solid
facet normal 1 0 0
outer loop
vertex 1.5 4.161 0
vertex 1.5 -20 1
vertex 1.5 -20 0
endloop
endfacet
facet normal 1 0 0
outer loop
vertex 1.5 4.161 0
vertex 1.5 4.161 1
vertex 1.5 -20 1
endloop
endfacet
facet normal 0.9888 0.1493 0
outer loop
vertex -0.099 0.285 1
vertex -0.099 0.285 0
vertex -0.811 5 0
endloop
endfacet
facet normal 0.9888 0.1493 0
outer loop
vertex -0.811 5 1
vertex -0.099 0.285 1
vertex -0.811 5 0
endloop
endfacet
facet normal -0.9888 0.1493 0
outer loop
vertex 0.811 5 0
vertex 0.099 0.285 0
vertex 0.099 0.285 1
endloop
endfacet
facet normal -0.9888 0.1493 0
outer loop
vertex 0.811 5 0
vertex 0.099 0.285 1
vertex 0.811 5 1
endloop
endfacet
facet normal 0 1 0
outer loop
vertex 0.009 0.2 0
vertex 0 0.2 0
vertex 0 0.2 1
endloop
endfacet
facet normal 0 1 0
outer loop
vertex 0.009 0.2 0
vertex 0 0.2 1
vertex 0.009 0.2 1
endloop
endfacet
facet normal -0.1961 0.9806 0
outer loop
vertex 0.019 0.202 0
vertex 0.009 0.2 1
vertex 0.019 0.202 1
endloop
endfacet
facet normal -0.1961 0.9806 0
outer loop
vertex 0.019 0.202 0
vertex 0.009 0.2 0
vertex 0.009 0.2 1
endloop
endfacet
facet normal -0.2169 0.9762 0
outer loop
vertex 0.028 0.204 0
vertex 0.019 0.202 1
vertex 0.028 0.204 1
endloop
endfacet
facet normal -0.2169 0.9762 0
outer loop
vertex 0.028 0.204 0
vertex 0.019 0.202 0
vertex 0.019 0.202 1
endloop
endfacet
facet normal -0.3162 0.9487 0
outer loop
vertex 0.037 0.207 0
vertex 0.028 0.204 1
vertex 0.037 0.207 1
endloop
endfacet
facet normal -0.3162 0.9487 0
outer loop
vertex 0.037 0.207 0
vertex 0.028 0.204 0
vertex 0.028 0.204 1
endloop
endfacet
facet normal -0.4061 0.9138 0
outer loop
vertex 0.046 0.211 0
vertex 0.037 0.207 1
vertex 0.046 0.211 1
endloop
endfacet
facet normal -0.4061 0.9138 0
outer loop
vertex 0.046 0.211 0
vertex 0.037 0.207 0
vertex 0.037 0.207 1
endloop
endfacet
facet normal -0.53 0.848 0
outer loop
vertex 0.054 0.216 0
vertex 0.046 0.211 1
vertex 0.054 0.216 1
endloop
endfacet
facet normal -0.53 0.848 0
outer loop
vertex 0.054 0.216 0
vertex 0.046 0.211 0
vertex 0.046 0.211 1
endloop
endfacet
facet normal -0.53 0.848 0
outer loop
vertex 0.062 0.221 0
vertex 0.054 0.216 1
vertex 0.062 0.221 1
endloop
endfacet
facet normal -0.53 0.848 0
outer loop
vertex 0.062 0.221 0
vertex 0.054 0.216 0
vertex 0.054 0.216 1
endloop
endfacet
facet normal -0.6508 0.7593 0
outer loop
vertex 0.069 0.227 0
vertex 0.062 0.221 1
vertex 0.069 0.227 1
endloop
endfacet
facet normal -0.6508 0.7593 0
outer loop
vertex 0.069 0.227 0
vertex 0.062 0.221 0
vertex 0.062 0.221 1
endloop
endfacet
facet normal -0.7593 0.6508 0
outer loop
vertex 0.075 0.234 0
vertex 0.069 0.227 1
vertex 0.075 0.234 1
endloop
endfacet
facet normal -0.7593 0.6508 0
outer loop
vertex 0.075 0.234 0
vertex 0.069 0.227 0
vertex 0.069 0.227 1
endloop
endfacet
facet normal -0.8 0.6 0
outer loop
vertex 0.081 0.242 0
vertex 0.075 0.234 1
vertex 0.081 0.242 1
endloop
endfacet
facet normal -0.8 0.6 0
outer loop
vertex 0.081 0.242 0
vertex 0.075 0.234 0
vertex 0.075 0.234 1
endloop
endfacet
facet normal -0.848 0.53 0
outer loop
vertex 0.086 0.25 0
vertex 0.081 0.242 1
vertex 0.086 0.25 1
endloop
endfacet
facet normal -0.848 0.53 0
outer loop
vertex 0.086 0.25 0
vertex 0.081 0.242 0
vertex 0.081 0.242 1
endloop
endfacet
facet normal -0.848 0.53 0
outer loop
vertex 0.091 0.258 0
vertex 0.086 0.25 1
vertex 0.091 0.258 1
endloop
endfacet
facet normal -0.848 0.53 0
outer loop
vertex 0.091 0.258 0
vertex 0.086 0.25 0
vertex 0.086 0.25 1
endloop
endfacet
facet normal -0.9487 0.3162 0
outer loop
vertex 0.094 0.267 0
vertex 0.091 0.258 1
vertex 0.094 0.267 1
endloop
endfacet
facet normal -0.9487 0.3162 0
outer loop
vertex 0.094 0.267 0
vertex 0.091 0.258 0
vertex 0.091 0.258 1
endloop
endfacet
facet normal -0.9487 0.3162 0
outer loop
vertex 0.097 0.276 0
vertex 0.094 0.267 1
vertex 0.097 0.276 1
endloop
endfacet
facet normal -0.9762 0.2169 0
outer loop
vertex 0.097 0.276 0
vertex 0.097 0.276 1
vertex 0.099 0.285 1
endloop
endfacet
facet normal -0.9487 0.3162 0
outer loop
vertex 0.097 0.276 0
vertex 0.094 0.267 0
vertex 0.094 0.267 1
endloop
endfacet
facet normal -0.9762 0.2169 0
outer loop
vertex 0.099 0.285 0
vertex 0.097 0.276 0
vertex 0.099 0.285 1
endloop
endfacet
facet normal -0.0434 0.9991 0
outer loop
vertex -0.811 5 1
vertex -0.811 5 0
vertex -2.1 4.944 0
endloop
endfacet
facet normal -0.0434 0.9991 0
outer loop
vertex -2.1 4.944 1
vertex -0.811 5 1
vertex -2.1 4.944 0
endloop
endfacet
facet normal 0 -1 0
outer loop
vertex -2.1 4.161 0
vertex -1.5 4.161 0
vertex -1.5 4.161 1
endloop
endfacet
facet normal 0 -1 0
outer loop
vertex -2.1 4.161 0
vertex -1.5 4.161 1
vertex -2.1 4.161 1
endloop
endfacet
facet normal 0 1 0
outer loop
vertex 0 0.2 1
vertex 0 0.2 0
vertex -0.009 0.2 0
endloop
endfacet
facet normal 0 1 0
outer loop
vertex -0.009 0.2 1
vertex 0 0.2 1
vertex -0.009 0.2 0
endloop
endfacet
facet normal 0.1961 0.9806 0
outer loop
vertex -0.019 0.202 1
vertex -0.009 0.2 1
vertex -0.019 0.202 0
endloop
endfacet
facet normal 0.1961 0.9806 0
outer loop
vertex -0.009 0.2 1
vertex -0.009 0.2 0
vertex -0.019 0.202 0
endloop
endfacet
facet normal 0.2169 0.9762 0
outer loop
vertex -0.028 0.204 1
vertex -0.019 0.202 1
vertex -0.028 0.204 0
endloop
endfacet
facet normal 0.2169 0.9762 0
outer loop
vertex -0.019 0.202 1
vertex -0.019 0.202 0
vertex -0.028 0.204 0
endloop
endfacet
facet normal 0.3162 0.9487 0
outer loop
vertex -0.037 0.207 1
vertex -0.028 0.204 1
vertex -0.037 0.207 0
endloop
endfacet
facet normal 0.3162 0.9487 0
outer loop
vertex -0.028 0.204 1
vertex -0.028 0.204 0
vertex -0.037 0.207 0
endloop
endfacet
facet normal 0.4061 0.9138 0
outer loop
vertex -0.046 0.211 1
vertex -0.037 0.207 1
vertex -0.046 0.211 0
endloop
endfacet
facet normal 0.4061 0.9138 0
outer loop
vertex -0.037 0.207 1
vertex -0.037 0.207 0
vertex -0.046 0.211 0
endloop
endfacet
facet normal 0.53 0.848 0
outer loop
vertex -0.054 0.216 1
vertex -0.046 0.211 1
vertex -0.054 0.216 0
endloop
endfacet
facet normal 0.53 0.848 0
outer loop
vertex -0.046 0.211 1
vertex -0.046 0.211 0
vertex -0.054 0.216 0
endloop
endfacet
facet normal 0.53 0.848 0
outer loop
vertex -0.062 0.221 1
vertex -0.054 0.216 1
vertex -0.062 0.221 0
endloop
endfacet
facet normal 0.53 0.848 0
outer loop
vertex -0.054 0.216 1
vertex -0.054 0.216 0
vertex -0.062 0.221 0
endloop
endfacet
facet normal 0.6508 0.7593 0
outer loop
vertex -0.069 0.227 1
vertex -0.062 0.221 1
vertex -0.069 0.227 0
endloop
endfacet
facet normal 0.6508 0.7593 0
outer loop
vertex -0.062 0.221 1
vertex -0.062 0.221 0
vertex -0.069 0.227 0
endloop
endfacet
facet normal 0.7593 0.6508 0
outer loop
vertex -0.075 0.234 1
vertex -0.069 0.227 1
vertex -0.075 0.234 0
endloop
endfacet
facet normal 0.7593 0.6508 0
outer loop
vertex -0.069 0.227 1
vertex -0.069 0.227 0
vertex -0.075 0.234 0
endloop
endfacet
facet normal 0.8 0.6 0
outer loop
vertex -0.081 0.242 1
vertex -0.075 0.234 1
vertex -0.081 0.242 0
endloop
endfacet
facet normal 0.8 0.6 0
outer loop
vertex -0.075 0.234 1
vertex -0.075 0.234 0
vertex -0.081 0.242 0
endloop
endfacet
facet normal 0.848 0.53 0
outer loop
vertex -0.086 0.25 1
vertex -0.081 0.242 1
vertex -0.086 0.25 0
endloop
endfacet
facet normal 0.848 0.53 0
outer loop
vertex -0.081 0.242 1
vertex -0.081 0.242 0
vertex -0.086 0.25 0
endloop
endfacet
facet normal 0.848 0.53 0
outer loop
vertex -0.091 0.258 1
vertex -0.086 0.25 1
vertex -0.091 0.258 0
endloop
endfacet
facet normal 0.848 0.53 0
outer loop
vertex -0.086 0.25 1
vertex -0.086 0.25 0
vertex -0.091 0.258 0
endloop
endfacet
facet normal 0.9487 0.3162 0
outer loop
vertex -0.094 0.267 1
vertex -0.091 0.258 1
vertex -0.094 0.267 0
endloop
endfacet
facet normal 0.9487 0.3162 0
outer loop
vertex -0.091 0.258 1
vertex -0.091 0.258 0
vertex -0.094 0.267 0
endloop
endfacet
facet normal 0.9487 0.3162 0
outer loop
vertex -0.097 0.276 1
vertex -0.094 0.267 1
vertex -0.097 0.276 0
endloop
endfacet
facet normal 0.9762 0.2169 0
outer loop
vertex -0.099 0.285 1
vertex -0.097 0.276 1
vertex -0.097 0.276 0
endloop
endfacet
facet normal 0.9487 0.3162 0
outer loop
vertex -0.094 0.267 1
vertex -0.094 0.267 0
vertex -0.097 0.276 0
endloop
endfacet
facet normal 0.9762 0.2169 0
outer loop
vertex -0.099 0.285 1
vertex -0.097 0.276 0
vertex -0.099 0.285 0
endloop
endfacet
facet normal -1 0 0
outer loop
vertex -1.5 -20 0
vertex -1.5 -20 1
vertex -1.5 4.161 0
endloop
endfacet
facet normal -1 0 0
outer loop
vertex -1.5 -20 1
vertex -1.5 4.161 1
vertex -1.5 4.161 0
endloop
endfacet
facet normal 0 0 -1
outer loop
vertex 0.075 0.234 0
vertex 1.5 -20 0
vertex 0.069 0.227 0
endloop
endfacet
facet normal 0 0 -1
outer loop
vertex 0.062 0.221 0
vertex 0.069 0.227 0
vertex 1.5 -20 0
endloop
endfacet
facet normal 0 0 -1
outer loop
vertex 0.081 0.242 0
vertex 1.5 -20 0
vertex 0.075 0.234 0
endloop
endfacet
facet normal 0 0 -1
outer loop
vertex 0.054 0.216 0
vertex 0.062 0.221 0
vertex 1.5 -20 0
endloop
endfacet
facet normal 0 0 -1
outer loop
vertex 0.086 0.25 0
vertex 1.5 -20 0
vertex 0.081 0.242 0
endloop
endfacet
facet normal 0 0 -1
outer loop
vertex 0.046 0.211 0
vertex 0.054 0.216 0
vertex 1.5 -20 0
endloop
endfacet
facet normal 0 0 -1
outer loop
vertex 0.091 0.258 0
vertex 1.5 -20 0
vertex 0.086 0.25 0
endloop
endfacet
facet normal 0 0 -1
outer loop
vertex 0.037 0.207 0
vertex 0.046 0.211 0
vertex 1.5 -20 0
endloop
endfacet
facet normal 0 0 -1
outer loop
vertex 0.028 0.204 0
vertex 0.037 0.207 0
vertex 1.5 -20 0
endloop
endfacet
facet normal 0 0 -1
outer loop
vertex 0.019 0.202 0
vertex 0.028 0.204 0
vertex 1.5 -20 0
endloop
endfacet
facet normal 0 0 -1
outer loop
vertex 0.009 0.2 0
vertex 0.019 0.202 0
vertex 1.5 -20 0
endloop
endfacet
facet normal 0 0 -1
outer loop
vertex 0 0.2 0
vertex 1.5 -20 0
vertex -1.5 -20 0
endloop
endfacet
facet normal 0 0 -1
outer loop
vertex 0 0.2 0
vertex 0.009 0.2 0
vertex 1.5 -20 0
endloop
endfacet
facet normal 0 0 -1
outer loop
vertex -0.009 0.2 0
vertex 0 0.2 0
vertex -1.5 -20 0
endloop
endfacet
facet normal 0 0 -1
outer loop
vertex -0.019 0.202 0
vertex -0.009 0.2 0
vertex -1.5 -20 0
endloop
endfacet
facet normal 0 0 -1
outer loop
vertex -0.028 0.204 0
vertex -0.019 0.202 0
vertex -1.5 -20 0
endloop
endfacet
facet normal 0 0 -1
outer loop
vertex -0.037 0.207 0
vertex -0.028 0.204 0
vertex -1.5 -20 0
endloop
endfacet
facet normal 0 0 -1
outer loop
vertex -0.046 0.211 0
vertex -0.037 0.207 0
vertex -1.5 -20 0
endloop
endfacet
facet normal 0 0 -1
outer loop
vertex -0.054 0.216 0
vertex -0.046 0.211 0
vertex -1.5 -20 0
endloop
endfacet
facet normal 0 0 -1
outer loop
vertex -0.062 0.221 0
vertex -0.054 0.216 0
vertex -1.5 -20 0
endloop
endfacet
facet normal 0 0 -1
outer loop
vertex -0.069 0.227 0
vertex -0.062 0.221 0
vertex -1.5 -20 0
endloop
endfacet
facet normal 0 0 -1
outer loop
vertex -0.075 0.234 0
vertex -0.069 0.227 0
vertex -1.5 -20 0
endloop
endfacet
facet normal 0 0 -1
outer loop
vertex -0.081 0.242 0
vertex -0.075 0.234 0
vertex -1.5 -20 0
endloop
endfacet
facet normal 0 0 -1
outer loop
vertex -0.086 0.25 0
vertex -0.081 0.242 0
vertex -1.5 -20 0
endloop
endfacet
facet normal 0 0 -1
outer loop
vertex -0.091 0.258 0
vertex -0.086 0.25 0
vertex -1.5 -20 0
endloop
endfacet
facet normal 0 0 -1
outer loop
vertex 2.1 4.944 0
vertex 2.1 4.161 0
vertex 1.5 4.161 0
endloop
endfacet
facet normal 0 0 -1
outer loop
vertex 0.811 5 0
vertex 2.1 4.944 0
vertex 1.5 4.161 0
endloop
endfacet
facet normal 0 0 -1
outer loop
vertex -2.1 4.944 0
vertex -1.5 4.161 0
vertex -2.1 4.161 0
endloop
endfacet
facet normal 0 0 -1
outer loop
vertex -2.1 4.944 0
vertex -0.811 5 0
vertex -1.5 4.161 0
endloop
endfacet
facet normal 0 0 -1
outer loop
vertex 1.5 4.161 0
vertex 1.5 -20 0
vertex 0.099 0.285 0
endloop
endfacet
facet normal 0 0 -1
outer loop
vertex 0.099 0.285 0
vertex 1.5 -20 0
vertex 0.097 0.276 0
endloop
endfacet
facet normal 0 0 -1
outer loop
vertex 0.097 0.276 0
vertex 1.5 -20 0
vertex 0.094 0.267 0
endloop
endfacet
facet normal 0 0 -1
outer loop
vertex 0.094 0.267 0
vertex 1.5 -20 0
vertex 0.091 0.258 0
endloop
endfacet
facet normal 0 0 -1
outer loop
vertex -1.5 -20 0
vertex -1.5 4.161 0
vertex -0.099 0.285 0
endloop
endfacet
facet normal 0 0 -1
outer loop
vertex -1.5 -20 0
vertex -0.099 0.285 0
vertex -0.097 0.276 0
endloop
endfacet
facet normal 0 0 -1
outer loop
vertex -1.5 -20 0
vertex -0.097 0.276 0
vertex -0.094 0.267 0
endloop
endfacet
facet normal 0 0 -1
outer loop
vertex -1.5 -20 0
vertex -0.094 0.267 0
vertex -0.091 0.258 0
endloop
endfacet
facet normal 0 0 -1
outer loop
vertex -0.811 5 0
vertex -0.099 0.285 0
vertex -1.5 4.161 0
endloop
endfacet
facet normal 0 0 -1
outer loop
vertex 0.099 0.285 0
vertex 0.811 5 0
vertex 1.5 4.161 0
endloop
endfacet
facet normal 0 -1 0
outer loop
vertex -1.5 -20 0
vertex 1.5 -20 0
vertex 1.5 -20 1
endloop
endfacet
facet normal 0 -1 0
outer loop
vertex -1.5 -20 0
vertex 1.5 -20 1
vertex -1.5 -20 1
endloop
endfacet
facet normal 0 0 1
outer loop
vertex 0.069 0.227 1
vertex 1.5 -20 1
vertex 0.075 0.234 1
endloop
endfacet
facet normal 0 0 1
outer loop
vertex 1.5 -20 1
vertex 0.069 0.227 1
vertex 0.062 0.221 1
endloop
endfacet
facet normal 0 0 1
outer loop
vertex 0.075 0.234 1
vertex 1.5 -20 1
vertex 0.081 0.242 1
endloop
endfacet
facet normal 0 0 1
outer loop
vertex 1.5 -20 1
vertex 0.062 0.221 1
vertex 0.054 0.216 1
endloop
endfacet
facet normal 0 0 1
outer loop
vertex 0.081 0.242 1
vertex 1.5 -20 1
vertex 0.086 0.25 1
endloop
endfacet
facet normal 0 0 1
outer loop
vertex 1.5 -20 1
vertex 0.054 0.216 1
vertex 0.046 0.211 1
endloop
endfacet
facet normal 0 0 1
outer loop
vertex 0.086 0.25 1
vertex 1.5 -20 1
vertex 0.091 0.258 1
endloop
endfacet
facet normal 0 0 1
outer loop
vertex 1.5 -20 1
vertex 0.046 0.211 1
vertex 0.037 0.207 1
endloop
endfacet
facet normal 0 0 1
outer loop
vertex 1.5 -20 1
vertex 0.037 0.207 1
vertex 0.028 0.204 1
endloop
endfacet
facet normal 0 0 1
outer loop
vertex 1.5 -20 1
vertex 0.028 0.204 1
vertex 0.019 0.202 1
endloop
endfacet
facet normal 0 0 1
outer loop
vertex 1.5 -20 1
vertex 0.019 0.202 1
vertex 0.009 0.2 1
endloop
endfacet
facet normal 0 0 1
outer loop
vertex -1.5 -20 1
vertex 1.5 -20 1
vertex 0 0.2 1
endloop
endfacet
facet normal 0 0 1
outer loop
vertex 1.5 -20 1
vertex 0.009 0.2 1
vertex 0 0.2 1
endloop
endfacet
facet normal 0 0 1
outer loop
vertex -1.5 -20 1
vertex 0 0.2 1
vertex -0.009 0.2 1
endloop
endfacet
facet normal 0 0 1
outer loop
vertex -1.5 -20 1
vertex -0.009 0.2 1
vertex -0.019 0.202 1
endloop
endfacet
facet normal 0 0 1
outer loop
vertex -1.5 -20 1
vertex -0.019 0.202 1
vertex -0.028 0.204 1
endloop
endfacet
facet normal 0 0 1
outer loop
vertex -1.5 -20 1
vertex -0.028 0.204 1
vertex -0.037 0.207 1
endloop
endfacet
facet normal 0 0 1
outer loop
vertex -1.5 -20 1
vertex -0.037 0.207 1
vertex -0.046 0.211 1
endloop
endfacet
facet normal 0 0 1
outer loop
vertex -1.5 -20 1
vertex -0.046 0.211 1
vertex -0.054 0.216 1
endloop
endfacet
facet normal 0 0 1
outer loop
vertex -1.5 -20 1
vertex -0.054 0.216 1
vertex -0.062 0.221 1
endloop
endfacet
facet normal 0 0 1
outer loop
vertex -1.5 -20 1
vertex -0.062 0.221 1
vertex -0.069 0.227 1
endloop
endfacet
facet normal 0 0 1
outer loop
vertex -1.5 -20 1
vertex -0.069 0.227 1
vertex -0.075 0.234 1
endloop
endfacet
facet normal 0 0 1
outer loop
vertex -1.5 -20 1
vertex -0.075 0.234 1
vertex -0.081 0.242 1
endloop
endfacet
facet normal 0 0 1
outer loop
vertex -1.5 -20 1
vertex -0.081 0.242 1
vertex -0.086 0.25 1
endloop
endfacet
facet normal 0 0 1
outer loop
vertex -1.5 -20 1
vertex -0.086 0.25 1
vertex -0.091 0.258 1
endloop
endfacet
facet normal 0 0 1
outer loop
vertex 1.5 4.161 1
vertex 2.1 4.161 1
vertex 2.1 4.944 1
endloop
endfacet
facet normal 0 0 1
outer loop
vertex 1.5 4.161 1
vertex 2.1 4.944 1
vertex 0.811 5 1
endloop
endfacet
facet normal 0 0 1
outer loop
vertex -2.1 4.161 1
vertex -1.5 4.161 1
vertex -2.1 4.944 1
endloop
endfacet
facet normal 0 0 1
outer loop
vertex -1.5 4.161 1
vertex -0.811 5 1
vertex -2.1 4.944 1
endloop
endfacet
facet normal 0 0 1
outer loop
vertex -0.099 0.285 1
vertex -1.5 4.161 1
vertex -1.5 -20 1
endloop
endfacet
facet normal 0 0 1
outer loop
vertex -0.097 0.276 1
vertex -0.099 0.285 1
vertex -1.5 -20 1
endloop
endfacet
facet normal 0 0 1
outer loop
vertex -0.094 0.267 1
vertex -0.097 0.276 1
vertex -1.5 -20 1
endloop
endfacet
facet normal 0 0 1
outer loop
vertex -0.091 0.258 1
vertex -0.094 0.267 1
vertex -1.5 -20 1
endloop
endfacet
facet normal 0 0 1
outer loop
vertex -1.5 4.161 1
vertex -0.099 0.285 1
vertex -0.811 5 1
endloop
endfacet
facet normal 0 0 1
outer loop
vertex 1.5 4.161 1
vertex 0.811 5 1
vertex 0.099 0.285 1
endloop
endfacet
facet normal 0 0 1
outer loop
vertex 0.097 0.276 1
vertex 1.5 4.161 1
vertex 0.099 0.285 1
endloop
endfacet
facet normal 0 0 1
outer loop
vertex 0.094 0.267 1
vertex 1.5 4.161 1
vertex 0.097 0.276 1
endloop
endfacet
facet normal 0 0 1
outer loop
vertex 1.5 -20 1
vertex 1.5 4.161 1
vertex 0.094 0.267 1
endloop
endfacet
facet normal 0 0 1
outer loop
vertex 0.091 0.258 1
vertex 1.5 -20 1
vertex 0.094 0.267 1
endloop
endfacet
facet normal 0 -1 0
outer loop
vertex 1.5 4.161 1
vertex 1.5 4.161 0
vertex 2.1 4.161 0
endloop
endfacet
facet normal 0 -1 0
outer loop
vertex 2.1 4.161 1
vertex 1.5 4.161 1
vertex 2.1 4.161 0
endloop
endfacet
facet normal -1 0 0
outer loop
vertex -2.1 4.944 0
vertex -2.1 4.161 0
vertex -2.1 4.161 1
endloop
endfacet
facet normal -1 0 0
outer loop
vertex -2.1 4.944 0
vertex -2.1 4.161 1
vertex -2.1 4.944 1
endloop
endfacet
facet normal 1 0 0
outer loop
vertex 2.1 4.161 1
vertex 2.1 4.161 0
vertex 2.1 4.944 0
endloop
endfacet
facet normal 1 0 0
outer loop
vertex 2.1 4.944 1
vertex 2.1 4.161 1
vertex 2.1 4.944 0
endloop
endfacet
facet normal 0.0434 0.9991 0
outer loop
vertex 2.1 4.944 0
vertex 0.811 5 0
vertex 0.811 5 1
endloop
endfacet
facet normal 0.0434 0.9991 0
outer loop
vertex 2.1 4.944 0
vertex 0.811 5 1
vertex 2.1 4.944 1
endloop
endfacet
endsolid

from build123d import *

# Parameters (mm, degrees)
PAD003_DEPTH        = 1
MIRRORED005_FACE6_W = 3
MIRRORED005_FACE6_H = 1
PAD004_DEPTH        = 20


with BuildPart() as part:
    # Sketch006 → Pad003 (new body)
    with BuildSketch(Plane.XY):
        with BuildLine():
            Line((0, 0), (1.5, 0))
            Line((1.5, 0), (1.5, 4.160967))
            Line((1.5, 4.160967), (2.1, 4.160967))
            Line((2.1, 4.160967), (2.1, 4.943956))
            Line((0.810822, 5), (2.1, 4.943956))
            Line((0.098879, 0.28507), (0.810822, 5))
            ThreePointArc((0, 0.2), (0.065219, 0.224194), (0.098879, 0.28507))
            Line((0, 0), (0, 0.2))
        make_face()
    pad003 = extrude(amount=PAD003_DEPTH)

    # Mirrored005: Pad003 across Sketch006 V_Axis
    add(pad003.mirror(Plane(origin=(0, 0, 0), x_dir=(0, 0, 1), z_dir=(1, 0, 0))))

    # Mirrored005 Face6 → Pad004 (add)
    with BuildSketch(Plane(origin=(0, 0, 0.5), x_dir=(-1, 0, 0), z_dir=(0, -1, 0))):
        Rectangle(MIRRORED005_FACE6_W, MIRRORED005_FACE6_H)
    extrude(amount=PAD004_DEPTH)


solid = part.part
